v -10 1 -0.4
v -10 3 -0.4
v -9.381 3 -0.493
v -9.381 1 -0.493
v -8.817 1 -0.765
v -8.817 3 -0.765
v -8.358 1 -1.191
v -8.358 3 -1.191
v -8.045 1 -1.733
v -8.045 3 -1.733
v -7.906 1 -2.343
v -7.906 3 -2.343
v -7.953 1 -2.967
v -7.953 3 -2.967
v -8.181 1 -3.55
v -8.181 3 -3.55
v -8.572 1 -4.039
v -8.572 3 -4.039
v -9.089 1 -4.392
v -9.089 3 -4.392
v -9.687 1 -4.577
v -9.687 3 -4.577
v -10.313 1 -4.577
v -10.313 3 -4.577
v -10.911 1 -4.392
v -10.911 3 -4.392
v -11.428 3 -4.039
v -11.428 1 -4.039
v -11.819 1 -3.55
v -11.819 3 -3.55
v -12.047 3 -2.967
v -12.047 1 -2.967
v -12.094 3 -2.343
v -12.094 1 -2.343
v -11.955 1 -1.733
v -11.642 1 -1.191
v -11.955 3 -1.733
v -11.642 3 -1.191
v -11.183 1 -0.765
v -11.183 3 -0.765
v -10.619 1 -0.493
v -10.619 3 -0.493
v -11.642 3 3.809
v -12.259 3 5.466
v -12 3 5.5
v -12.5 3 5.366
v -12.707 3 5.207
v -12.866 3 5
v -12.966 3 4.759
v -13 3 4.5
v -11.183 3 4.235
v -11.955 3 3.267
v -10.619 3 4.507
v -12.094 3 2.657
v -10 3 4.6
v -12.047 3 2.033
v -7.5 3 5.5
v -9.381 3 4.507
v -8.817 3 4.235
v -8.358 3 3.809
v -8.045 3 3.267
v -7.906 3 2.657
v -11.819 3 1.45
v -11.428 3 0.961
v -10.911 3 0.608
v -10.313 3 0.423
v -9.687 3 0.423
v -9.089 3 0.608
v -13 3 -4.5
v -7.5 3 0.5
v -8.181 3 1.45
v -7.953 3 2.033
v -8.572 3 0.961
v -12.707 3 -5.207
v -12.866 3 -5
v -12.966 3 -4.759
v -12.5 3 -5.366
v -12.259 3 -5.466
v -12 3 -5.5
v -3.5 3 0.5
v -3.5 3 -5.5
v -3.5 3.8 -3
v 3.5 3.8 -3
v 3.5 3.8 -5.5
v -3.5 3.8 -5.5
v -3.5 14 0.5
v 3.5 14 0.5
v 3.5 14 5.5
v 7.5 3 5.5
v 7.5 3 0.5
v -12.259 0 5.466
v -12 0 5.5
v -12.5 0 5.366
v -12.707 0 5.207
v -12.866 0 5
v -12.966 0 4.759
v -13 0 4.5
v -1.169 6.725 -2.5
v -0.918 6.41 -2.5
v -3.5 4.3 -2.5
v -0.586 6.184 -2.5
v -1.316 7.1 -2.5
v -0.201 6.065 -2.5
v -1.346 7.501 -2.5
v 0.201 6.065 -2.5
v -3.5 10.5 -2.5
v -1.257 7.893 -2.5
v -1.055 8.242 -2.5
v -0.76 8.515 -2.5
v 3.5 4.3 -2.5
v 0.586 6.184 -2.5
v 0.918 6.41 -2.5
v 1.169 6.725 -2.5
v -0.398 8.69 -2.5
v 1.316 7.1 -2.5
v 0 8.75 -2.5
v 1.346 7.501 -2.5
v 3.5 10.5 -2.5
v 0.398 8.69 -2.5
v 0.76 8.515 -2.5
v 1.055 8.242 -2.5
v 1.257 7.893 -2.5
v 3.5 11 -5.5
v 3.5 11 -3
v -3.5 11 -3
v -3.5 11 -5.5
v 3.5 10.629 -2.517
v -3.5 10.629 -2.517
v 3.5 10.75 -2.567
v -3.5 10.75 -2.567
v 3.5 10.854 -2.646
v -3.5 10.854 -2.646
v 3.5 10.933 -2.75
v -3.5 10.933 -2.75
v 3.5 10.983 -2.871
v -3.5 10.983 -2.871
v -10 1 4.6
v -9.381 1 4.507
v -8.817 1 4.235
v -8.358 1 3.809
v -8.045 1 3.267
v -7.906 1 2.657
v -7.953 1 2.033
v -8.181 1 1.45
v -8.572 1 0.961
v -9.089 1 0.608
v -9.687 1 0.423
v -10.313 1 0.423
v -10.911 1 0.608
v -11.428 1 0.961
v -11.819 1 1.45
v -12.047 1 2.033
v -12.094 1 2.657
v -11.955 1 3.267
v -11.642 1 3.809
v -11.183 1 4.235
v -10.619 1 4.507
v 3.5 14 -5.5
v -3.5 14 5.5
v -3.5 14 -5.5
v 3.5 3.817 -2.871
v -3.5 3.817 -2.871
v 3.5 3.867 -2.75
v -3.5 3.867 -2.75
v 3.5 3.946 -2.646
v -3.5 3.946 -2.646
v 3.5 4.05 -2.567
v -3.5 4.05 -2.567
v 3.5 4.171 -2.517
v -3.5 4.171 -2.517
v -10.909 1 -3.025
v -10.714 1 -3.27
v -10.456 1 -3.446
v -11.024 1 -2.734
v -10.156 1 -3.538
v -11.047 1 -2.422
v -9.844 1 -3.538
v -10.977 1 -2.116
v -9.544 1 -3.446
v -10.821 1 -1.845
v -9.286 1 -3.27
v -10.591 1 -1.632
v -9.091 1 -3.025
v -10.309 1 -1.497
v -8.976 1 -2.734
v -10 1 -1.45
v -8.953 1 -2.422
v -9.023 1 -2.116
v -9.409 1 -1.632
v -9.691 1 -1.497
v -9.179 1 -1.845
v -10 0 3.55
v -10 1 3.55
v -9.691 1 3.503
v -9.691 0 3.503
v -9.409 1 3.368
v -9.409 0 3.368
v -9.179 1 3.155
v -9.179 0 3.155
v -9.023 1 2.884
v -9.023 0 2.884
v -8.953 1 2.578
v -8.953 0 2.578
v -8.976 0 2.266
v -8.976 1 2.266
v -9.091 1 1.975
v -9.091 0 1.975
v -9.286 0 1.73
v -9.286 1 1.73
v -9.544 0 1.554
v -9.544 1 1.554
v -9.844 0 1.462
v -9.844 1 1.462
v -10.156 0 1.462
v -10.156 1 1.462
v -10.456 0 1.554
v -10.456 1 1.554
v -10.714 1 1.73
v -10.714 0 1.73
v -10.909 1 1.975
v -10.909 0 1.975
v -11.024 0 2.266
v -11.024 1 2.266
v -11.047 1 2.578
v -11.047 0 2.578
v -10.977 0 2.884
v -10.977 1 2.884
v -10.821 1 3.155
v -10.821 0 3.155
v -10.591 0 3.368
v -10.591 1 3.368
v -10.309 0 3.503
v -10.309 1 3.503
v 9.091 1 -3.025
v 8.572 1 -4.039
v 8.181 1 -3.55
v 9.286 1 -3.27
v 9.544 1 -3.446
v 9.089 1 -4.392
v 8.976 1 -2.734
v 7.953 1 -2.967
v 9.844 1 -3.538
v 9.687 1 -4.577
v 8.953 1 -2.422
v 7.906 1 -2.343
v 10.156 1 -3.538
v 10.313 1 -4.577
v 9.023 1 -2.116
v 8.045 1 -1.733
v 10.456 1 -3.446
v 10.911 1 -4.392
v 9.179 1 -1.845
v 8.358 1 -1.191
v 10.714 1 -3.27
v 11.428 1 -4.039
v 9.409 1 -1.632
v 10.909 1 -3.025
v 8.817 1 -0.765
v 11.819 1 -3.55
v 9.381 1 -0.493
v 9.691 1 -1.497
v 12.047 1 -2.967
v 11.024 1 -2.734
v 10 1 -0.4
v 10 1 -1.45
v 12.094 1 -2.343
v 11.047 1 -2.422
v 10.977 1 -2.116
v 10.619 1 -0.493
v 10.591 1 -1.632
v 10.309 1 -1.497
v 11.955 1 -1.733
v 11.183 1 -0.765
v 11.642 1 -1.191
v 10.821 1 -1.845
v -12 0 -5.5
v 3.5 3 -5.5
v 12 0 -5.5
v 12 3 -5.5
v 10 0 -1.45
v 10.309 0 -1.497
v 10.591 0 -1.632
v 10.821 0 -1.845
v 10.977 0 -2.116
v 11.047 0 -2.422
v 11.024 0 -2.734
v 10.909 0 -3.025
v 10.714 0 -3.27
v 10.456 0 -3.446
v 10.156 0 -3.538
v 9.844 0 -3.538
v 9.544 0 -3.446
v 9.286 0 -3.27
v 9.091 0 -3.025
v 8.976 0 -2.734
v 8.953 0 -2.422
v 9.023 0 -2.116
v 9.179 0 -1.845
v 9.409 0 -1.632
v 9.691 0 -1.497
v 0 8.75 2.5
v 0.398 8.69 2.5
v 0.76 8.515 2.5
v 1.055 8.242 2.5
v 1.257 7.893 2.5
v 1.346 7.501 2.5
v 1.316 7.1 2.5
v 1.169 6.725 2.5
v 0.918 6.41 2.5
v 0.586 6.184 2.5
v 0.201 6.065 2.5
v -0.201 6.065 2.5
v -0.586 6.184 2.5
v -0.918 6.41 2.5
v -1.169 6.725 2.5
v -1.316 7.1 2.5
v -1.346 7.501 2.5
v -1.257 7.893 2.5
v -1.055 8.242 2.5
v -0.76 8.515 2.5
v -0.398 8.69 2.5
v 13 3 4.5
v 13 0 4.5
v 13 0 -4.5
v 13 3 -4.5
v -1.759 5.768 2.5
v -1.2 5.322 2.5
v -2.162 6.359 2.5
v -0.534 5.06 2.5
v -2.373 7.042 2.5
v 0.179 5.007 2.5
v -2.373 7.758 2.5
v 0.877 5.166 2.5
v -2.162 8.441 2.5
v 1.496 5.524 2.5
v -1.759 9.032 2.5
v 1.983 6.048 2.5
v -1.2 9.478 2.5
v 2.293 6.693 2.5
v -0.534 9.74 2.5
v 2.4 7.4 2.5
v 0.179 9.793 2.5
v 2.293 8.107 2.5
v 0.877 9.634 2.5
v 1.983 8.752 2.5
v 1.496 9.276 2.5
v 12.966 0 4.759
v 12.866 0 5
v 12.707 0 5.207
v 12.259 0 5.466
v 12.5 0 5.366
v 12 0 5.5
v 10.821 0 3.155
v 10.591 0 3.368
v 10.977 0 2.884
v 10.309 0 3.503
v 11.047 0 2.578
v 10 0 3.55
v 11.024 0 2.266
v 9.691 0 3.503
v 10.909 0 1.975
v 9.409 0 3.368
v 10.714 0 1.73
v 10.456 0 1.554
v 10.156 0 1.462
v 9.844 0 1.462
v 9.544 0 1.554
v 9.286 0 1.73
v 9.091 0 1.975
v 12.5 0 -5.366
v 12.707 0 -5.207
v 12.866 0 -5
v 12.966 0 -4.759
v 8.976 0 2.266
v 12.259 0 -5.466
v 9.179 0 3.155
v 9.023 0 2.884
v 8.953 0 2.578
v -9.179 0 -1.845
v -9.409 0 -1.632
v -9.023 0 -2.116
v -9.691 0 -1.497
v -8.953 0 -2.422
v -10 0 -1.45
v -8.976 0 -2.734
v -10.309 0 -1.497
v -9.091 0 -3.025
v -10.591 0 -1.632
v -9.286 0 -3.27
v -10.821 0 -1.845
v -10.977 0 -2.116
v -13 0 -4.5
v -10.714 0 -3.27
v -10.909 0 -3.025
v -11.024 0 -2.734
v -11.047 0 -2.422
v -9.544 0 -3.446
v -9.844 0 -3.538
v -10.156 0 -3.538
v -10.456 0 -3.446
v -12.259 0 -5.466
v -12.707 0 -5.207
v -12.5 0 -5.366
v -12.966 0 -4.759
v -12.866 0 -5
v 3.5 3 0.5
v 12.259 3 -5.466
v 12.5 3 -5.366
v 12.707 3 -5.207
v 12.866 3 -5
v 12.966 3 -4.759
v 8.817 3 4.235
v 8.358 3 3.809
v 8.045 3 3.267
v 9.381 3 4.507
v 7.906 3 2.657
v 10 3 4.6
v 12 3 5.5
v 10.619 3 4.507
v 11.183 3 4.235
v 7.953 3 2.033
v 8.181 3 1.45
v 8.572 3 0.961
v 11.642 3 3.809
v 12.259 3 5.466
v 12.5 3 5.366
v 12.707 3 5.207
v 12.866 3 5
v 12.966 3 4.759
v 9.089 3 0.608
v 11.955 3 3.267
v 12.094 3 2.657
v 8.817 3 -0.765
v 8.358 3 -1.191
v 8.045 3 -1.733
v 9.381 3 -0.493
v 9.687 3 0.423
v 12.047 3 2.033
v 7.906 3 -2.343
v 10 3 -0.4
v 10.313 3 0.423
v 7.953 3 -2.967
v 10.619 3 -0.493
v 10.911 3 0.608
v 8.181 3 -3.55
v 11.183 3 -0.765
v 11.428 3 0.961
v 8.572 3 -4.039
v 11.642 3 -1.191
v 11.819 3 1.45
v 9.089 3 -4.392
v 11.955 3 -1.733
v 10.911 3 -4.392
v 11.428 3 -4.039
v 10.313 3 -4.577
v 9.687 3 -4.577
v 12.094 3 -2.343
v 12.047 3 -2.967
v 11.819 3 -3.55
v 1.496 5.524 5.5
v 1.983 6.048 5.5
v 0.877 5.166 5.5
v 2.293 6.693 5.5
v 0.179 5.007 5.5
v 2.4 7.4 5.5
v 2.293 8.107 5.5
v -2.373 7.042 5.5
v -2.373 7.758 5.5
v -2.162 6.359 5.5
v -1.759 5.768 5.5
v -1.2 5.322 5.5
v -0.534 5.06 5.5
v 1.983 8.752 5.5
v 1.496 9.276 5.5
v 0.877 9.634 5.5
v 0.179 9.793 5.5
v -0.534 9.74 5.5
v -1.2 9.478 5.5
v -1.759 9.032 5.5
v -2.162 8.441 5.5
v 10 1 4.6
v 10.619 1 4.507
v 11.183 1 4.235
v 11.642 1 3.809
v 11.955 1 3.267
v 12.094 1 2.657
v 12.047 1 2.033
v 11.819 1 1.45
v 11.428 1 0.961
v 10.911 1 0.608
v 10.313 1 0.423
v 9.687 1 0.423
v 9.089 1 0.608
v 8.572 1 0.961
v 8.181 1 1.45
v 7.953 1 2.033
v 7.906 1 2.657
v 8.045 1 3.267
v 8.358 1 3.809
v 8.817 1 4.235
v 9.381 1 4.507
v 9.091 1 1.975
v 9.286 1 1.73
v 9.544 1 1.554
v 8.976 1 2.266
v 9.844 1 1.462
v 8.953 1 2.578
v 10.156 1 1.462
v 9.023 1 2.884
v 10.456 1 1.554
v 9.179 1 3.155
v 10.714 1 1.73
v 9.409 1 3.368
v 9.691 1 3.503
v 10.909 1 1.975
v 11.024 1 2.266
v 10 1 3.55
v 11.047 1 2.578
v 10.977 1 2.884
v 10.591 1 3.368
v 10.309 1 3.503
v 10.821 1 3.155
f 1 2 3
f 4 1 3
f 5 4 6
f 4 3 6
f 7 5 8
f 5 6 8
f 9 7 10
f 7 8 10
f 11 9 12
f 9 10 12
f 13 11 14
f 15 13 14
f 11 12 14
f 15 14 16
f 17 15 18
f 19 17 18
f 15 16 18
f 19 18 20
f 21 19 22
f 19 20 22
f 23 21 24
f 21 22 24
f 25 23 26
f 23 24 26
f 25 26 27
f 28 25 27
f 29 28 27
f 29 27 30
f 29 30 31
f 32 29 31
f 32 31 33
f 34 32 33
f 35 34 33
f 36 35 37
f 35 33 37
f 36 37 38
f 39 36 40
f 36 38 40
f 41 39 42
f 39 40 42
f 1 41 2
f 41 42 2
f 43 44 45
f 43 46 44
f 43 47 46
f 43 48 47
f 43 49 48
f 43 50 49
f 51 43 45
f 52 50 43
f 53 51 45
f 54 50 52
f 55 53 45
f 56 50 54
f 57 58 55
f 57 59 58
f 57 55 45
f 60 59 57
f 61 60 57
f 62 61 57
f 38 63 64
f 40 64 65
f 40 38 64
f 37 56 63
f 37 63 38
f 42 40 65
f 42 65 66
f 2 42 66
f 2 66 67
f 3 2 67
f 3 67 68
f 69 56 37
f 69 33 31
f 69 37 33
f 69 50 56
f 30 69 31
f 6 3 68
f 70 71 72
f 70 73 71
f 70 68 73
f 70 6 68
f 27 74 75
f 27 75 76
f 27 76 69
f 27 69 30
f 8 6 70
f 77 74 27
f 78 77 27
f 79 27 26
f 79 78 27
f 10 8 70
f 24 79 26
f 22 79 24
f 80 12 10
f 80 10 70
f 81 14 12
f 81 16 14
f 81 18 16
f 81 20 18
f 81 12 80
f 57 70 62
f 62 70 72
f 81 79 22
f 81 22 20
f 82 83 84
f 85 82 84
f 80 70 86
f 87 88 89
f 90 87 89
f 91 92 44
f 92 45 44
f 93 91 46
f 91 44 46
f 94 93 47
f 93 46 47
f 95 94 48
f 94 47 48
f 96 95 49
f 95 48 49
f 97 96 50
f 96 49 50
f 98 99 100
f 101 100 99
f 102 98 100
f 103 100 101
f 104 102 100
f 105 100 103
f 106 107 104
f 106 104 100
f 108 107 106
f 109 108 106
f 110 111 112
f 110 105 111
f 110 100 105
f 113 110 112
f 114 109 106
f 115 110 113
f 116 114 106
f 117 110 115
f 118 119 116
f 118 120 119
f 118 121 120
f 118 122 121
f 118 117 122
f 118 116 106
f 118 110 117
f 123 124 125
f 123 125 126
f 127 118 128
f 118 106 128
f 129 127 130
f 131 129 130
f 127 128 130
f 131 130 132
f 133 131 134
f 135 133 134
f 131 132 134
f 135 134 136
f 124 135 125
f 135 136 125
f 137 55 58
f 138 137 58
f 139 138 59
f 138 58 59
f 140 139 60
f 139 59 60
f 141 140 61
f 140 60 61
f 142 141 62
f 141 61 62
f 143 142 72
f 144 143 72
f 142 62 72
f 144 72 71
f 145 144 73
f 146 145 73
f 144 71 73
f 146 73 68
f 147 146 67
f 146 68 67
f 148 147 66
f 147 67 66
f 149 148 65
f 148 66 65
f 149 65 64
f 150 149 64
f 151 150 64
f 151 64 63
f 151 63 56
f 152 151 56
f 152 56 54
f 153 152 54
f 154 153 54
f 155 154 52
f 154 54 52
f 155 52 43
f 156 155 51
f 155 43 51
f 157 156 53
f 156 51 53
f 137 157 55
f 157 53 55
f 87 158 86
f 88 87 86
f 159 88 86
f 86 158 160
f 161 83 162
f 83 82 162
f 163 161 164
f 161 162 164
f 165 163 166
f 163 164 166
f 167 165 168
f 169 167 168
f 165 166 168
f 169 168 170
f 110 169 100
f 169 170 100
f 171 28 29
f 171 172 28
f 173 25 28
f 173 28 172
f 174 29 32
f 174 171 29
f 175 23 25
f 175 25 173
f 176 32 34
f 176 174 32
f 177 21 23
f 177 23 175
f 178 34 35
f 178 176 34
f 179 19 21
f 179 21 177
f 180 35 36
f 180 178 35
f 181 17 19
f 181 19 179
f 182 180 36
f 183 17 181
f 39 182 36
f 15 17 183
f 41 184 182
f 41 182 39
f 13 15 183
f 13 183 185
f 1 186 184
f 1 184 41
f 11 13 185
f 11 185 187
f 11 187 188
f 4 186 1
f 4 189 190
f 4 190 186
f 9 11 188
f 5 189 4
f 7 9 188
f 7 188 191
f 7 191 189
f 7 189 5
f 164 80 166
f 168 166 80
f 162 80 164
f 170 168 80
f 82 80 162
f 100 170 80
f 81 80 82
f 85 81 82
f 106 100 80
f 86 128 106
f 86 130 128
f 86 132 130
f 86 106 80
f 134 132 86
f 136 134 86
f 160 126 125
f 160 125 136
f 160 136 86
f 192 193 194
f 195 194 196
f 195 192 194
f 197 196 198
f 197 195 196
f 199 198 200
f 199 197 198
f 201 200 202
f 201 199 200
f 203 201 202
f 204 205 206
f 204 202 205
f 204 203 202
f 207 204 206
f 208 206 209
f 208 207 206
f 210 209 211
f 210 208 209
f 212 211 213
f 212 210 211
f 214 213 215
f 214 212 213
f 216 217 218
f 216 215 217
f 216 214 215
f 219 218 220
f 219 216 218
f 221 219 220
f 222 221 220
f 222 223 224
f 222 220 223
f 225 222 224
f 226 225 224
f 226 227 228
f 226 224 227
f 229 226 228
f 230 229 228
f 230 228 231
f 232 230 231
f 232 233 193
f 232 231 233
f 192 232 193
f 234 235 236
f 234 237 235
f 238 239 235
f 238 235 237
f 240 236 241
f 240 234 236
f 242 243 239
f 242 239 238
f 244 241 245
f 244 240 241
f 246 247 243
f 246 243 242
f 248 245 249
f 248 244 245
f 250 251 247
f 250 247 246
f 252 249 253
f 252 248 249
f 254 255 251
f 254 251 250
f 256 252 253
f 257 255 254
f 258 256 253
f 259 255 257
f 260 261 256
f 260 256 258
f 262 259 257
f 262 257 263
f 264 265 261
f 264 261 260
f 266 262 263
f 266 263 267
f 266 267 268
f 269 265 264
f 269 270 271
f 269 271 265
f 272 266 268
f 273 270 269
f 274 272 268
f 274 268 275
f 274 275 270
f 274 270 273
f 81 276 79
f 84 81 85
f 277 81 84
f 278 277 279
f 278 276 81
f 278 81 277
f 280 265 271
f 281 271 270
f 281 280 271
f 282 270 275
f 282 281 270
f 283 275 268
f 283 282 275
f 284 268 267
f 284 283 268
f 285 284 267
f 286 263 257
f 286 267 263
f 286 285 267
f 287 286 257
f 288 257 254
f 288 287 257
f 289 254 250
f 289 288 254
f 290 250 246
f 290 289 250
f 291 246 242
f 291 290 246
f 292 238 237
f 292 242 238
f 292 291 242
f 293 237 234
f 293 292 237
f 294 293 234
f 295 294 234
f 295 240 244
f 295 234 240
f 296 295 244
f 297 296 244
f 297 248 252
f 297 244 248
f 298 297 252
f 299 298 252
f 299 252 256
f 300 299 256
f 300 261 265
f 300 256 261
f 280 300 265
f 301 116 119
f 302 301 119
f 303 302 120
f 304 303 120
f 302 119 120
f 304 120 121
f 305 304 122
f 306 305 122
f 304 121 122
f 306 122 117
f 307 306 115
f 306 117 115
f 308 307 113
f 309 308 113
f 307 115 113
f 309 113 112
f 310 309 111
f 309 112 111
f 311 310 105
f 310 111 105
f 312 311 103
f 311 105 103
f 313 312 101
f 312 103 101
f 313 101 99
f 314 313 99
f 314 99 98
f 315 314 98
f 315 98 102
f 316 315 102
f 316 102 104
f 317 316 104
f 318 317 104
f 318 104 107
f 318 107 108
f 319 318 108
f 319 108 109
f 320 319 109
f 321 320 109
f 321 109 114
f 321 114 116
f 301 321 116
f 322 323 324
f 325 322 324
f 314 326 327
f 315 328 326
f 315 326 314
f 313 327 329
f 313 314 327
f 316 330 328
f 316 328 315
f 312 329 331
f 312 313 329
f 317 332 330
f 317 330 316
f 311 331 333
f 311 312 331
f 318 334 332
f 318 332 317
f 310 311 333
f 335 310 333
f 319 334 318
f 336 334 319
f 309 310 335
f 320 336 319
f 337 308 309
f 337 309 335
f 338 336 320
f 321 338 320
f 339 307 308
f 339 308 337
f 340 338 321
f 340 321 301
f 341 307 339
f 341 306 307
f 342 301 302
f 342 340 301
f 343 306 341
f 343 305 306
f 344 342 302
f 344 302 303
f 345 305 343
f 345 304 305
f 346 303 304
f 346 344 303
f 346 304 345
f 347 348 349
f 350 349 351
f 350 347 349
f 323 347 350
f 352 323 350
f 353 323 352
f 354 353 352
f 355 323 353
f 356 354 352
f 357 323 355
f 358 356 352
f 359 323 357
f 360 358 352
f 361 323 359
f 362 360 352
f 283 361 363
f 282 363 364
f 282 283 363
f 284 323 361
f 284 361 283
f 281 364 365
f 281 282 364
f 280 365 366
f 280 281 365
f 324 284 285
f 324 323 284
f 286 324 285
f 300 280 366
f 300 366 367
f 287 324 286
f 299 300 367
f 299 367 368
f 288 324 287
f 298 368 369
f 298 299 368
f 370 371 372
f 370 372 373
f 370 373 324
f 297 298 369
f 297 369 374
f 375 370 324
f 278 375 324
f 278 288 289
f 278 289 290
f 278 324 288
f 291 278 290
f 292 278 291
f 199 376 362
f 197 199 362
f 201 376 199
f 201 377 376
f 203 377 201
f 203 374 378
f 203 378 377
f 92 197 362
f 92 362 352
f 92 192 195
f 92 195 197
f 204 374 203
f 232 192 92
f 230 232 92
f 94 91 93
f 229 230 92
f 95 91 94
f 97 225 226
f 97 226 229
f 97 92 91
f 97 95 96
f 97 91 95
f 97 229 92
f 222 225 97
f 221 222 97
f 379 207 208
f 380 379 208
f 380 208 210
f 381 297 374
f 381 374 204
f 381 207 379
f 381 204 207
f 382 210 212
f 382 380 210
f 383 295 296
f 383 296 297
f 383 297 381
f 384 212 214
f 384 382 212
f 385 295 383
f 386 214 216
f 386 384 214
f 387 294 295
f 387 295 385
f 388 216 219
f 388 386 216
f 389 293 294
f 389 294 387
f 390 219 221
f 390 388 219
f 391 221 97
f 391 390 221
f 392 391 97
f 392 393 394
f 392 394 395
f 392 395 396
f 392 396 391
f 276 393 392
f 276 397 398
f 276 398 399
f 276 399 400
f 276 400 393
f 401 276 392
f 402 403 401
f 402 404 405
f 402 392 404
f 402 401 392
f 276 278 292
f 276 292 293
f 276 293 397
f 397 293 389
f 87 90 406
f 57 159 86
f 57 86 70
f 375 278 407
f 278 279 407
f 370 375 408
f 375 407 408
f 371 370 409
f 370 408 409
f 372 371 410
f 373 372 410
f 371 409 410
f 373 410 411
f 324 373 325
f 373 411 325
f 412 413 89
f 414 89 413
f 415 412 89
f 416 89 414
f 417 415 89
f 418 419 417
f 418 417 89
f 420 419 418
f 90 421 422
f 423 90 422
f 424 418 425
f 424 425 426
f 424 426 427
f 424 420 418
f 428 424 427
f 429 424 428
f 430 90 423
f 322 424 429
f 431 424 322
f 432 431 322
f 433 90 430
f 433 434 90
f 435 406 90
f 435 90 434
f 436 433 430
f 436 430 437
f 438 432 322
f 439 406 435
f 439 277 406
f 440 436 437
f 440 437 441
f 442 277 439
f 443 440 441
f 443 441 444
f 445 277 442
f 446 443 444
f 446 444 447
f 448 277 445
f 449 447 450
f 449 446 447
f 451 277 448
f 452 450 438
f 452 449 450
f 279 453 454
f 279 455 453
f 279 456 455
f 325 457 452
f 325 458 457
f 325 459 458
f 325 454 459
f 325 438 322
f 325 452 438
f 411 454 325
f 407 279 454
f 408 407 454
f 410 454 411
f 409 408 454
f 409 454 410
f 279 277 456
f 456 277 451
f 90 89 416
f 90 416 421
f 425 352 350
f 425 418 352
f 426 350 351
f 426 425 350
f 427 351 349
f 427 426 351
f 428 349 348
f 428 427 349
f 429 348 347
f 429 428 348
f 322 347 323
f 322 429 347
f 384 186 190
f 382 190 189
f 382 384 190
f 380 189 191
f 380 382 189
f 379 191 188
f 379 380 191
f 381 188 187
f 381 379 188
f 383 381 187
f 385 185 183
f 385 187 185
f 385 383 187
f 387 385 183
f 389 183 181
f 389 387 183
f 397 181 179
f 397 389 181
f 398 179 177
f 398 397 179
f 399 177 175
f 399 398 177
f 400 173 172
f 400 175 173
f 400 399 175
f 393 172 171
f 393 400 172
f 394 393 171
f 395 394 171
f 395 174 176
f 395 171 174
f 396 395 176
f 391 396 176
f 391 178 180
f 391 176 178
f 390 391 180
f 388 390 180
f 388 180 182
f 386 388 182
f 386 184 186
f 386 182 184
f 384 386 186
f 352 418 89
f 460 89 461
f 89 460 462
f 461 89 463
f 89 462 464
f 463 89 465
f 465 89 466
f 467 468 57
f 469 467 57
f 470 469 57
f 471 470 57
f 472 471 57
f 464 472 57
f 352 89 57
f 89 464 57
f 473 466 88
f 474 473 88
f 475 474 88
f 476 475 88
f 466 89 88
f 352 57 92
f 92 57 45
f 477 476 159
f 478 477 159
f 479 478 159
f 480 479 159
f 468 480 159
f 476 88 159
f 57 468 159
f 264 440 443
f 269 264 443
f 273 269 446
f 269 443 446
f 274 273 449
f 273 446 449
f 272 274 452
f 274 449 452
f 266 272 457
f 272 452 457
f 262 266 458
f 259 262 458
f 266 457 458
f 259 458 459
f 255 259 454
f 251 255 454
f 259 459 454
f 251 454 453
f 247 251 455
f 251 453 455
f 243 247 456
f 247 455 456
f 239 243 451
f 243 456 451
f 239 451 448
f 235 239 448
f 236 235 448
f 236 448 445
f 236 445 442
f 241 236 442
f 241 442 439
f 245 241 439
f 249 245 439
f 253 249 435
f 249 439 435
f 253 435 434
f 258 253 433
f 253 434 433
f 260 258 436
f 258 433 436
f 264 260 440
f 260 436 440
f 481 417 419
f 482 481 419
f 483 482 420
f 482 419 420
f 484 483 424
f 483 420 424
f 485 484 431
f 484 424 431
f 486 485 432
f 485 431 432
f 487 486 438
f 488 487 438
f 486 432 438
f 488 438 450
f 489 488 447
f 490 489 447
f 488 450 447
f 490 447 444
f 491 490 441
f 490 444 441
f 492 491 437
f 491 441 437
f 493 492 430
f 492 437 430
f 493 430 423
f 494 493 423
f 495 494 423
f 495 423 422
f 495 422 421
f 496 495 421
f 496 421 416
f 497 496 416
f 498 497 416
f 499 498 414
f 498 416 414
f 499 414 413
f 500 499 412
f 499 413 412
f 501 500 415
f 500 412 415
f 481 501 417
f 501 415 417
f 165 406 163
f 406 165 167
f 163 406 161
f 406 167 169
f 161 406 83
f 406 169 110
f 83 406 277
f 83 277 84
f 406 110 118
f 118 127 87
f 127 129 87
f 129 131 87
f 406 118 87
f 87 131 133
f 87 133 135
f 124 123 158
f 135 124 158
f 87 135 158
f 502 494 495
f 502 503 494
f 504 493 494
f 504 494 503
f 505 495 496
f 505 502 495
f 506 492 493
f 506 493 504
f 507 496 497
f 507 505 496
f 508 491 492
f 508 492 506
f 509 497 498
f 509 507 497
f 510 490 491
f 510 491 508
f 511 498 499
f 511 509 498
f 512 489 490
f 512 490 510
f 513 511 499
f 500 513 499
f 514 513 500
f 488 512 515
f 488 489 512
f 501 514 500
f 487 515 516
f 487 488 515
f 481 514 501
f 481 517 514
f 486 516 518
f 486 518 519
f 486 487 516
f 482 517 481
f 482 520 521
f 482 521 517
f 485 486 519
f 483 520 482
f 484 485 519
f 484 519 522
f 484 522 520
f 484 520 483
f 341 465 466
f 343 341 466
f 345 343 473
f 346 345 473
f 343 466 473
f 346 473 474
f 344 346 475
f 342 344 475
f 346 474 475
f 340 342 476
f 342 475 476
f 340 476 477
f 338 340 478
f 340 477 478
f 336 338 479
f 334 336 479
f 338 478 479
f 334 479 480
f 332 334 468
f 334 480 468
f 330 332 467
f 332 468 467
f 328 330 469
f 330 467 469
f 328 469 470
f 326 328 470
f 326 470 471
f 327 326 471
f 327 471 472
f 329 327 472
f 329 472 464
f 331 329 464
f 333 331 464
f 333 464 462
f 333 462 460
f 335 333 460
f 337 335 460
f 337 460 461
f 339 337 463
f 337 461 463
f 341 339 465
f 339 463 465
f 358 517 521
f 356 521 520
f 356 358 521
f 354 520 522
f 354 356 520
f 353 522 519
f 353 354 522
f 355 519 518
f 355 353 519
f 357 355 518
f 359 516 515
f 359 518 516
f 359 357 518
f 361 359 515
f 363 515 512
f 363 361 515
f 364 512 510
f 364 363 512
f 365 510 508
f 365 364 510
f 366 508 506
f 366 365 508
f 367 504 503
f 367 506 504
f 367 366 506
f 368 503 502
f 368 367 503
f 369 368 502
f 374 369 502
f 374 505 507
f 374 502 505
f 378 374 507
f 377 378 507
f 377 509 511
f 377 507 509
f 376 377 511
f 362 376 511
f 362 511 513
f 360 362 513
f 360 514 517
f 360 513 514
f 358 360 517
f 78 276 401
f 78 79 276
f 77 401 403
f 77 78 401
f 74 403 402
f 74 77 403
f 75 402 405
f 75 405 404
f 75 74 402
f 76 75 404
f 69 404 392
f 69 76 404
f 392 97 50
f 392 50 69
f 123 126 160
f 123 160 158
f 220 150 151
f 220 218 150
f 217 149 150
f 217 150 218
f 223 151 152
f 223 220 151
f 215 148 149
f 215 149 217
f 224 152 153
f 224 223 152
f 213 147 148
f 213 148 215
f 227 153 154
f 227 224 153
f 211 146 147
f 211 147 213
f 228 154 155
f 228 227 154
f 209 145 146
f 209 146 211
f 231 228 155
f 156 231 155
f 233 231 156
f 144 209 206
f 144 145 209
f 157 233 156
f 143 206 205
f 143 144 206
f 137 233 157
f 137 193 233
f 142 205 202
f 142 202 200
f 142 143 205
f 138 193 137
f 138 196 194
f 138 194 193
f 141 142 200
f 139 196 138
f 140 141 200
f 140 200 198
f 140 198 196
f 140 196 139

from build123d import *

# Parameters (mm, degrees)
SKETCH1_W           = 26
SKETCH1_H           = 11
SKETCH1_R           = 1.05
BOSS_EXTRUDE1_DEPTH = 3
SKETCH10_R          = 2.1
CUT_EXTRUDE6_DEPTH  = 2
SKETCH3_W           = 7
SKETCH3_H           = 14
BOSS_EXTRUDE2_DEPTH = 11
SKETCH6_W           = 3
SKETCH6_H           = 7.2
CUT_EXTRUDE3_DEPTH  = 23.327113562
SKETCH7_R           = 1.35
CUT_EXTRUDE4_DEPTH  = 21.712315177
SKETCH8_R           = 2.4
CUT_EXTRUDE5_DEPTH  = 3
FILLET1_R           = 0.5
FILLET2_R           = 1
BOSS_EXTRUDE3_DEPTH = 5


with BuildPart() as part:
    # Sketch1 → Boss-Extrude1 (new body)
    with BuildSketch(Plane(origin=(0, 0, 0), x_dir=(1, 0, 0), z_dir=(0, 1, 0))):
        Rectangle(SKETCH1_W, SKETCH1_H)
        with Locations(Location((-10, 2.5, 0), (0, 0, 270))):
            Circle(SKETCH1_R, mode=Mode.SUBTRACT)
        with Locations(Location((-10, -2.5, 0), (0, 0, 270))):
            Circle(SKETCH1_R, mode=Mode.SUBTRACT)
        with Locations(Location((10, 2.5, 0), (0, 0, 270))):
            Circle(SKETCH1_R, mode=Mode.SUBTRACT)
        with Locations(Location((10, -2.5, 0), (0, 0, 270))):
            Circle(SKETCH1_R, mode=Mode.SUBTRACT)
    extrude(amount=BOSS_EXTRUDE1_DEPTH)

    # Sketch10 → Cut-Extrude6 (cut)
    with BuildSketch(Plane(origin=(0, 3, 0), x_dir=(1, 0, 0), z_dir=(0, 1, 0))):
        with Locations(Location((-10, 2.5, 0), (0, 0, 270))):
            Circle(SKETCH10_R)
        with Locations(Location((-10, -2.5, 0), (0, 0, 270))):
            Circle(SKETCH10_R)
        with Locations(Location((10, 2.5, 0), (0, 0, 270))):
            Circle(SKETCH10_R)
        with Locations(Location((10, -2.5, 0), (0, 0, 270))):
            Circle(SKETCH10_R)
    extrude(amount=-CUT_EXTRUDE6_DEPTH, mode=Mode.SUBTRACT)

    # Sketch3 → Boss-Extrude2 (add)
    with BuildSketch(Plane(origin=(0, 0, -5.5), x_dir=(-1, 0, 0), z_dir=(0, 0, -1))):
        with Locations((0, 7)):
            Rectangle(SKETCH3_W, SKETCH3_H)
    extrude(amount=-BOSS_EXTRUDE2_DEPTH)

    # Sketch6 → Cut-Extrude3 (cut, through all)
    with BuildSketch(Plane(origin=(3.5, 0, 0), x_dir=(0, 0, -1), z_dir=(1, 0, 0))):
        with Locations((4, 7.4)):
            Rectangle(SKETCH6_W, SKETCH6_H)
    extrude(amount=-CUT_EXTRUDE3_DEPTH, mode=Mode.SUBTRACT)

    # Sketch7 → Cut-Extrude4 (cut, through all)
    with BuildSketch(Plane(origin=(0, 0, -2.5), x_dir=(-1, 0, 0), z_dir=(0, 0, -1))):
        with Locations(Location((0, 7.4, 0), (0, 0, 90))):
            Circle(SKETCH7_R)
    extrude(amount=-CUT_EXTRUDE4_DEPTH, mode=Mode.SUBTRACT)

    # Sketch8 → Cut-Extrude5 (cut)
    with BuildSketch(Plane.XY.offset(5.5)):
        with Locations((0, 7.4)):
            Circle(SKETCH8_R)
    extrude(amount=-CUT_EXTRUDE5_DEPTH, mode=Mode.SUBTRACT)

    # Fillet1
    fillet1_edges = [part.edges().sort_by_distance(p)[0] for p in [
        (0, 3.8, -2.5),
        (0, 11, -2.5),
    ]]
    fillet(fillet1_edges, radius=FILLET1_R)

    # Fillet2
    fillet2_edges = [part.edges().sort_by_distance(p)[0] for p in [
        (13, 1.5, 5.5),
        (-13, 1.5, 5.5),
        (-13, 1.5, -5.5),
        (13, 1.5, -5.5),
    ]]
    fillet(fillet2_edges, radius=FILLET2_R)

    # Sketch9 → Boss-Extrude3 (add)
    with BuildSketch(Plane.XY.offset(5.5)):
        Polygon((3.5, 3), (3.5, 14), (7.5, 3), align=None)
        Polygon((-7.5, 3), (-3.5, 3), (-3.5, 14), align=None)
    extrude(amount=-BOSS_EXTRUDE3_DEPTH)


solid = part.part
